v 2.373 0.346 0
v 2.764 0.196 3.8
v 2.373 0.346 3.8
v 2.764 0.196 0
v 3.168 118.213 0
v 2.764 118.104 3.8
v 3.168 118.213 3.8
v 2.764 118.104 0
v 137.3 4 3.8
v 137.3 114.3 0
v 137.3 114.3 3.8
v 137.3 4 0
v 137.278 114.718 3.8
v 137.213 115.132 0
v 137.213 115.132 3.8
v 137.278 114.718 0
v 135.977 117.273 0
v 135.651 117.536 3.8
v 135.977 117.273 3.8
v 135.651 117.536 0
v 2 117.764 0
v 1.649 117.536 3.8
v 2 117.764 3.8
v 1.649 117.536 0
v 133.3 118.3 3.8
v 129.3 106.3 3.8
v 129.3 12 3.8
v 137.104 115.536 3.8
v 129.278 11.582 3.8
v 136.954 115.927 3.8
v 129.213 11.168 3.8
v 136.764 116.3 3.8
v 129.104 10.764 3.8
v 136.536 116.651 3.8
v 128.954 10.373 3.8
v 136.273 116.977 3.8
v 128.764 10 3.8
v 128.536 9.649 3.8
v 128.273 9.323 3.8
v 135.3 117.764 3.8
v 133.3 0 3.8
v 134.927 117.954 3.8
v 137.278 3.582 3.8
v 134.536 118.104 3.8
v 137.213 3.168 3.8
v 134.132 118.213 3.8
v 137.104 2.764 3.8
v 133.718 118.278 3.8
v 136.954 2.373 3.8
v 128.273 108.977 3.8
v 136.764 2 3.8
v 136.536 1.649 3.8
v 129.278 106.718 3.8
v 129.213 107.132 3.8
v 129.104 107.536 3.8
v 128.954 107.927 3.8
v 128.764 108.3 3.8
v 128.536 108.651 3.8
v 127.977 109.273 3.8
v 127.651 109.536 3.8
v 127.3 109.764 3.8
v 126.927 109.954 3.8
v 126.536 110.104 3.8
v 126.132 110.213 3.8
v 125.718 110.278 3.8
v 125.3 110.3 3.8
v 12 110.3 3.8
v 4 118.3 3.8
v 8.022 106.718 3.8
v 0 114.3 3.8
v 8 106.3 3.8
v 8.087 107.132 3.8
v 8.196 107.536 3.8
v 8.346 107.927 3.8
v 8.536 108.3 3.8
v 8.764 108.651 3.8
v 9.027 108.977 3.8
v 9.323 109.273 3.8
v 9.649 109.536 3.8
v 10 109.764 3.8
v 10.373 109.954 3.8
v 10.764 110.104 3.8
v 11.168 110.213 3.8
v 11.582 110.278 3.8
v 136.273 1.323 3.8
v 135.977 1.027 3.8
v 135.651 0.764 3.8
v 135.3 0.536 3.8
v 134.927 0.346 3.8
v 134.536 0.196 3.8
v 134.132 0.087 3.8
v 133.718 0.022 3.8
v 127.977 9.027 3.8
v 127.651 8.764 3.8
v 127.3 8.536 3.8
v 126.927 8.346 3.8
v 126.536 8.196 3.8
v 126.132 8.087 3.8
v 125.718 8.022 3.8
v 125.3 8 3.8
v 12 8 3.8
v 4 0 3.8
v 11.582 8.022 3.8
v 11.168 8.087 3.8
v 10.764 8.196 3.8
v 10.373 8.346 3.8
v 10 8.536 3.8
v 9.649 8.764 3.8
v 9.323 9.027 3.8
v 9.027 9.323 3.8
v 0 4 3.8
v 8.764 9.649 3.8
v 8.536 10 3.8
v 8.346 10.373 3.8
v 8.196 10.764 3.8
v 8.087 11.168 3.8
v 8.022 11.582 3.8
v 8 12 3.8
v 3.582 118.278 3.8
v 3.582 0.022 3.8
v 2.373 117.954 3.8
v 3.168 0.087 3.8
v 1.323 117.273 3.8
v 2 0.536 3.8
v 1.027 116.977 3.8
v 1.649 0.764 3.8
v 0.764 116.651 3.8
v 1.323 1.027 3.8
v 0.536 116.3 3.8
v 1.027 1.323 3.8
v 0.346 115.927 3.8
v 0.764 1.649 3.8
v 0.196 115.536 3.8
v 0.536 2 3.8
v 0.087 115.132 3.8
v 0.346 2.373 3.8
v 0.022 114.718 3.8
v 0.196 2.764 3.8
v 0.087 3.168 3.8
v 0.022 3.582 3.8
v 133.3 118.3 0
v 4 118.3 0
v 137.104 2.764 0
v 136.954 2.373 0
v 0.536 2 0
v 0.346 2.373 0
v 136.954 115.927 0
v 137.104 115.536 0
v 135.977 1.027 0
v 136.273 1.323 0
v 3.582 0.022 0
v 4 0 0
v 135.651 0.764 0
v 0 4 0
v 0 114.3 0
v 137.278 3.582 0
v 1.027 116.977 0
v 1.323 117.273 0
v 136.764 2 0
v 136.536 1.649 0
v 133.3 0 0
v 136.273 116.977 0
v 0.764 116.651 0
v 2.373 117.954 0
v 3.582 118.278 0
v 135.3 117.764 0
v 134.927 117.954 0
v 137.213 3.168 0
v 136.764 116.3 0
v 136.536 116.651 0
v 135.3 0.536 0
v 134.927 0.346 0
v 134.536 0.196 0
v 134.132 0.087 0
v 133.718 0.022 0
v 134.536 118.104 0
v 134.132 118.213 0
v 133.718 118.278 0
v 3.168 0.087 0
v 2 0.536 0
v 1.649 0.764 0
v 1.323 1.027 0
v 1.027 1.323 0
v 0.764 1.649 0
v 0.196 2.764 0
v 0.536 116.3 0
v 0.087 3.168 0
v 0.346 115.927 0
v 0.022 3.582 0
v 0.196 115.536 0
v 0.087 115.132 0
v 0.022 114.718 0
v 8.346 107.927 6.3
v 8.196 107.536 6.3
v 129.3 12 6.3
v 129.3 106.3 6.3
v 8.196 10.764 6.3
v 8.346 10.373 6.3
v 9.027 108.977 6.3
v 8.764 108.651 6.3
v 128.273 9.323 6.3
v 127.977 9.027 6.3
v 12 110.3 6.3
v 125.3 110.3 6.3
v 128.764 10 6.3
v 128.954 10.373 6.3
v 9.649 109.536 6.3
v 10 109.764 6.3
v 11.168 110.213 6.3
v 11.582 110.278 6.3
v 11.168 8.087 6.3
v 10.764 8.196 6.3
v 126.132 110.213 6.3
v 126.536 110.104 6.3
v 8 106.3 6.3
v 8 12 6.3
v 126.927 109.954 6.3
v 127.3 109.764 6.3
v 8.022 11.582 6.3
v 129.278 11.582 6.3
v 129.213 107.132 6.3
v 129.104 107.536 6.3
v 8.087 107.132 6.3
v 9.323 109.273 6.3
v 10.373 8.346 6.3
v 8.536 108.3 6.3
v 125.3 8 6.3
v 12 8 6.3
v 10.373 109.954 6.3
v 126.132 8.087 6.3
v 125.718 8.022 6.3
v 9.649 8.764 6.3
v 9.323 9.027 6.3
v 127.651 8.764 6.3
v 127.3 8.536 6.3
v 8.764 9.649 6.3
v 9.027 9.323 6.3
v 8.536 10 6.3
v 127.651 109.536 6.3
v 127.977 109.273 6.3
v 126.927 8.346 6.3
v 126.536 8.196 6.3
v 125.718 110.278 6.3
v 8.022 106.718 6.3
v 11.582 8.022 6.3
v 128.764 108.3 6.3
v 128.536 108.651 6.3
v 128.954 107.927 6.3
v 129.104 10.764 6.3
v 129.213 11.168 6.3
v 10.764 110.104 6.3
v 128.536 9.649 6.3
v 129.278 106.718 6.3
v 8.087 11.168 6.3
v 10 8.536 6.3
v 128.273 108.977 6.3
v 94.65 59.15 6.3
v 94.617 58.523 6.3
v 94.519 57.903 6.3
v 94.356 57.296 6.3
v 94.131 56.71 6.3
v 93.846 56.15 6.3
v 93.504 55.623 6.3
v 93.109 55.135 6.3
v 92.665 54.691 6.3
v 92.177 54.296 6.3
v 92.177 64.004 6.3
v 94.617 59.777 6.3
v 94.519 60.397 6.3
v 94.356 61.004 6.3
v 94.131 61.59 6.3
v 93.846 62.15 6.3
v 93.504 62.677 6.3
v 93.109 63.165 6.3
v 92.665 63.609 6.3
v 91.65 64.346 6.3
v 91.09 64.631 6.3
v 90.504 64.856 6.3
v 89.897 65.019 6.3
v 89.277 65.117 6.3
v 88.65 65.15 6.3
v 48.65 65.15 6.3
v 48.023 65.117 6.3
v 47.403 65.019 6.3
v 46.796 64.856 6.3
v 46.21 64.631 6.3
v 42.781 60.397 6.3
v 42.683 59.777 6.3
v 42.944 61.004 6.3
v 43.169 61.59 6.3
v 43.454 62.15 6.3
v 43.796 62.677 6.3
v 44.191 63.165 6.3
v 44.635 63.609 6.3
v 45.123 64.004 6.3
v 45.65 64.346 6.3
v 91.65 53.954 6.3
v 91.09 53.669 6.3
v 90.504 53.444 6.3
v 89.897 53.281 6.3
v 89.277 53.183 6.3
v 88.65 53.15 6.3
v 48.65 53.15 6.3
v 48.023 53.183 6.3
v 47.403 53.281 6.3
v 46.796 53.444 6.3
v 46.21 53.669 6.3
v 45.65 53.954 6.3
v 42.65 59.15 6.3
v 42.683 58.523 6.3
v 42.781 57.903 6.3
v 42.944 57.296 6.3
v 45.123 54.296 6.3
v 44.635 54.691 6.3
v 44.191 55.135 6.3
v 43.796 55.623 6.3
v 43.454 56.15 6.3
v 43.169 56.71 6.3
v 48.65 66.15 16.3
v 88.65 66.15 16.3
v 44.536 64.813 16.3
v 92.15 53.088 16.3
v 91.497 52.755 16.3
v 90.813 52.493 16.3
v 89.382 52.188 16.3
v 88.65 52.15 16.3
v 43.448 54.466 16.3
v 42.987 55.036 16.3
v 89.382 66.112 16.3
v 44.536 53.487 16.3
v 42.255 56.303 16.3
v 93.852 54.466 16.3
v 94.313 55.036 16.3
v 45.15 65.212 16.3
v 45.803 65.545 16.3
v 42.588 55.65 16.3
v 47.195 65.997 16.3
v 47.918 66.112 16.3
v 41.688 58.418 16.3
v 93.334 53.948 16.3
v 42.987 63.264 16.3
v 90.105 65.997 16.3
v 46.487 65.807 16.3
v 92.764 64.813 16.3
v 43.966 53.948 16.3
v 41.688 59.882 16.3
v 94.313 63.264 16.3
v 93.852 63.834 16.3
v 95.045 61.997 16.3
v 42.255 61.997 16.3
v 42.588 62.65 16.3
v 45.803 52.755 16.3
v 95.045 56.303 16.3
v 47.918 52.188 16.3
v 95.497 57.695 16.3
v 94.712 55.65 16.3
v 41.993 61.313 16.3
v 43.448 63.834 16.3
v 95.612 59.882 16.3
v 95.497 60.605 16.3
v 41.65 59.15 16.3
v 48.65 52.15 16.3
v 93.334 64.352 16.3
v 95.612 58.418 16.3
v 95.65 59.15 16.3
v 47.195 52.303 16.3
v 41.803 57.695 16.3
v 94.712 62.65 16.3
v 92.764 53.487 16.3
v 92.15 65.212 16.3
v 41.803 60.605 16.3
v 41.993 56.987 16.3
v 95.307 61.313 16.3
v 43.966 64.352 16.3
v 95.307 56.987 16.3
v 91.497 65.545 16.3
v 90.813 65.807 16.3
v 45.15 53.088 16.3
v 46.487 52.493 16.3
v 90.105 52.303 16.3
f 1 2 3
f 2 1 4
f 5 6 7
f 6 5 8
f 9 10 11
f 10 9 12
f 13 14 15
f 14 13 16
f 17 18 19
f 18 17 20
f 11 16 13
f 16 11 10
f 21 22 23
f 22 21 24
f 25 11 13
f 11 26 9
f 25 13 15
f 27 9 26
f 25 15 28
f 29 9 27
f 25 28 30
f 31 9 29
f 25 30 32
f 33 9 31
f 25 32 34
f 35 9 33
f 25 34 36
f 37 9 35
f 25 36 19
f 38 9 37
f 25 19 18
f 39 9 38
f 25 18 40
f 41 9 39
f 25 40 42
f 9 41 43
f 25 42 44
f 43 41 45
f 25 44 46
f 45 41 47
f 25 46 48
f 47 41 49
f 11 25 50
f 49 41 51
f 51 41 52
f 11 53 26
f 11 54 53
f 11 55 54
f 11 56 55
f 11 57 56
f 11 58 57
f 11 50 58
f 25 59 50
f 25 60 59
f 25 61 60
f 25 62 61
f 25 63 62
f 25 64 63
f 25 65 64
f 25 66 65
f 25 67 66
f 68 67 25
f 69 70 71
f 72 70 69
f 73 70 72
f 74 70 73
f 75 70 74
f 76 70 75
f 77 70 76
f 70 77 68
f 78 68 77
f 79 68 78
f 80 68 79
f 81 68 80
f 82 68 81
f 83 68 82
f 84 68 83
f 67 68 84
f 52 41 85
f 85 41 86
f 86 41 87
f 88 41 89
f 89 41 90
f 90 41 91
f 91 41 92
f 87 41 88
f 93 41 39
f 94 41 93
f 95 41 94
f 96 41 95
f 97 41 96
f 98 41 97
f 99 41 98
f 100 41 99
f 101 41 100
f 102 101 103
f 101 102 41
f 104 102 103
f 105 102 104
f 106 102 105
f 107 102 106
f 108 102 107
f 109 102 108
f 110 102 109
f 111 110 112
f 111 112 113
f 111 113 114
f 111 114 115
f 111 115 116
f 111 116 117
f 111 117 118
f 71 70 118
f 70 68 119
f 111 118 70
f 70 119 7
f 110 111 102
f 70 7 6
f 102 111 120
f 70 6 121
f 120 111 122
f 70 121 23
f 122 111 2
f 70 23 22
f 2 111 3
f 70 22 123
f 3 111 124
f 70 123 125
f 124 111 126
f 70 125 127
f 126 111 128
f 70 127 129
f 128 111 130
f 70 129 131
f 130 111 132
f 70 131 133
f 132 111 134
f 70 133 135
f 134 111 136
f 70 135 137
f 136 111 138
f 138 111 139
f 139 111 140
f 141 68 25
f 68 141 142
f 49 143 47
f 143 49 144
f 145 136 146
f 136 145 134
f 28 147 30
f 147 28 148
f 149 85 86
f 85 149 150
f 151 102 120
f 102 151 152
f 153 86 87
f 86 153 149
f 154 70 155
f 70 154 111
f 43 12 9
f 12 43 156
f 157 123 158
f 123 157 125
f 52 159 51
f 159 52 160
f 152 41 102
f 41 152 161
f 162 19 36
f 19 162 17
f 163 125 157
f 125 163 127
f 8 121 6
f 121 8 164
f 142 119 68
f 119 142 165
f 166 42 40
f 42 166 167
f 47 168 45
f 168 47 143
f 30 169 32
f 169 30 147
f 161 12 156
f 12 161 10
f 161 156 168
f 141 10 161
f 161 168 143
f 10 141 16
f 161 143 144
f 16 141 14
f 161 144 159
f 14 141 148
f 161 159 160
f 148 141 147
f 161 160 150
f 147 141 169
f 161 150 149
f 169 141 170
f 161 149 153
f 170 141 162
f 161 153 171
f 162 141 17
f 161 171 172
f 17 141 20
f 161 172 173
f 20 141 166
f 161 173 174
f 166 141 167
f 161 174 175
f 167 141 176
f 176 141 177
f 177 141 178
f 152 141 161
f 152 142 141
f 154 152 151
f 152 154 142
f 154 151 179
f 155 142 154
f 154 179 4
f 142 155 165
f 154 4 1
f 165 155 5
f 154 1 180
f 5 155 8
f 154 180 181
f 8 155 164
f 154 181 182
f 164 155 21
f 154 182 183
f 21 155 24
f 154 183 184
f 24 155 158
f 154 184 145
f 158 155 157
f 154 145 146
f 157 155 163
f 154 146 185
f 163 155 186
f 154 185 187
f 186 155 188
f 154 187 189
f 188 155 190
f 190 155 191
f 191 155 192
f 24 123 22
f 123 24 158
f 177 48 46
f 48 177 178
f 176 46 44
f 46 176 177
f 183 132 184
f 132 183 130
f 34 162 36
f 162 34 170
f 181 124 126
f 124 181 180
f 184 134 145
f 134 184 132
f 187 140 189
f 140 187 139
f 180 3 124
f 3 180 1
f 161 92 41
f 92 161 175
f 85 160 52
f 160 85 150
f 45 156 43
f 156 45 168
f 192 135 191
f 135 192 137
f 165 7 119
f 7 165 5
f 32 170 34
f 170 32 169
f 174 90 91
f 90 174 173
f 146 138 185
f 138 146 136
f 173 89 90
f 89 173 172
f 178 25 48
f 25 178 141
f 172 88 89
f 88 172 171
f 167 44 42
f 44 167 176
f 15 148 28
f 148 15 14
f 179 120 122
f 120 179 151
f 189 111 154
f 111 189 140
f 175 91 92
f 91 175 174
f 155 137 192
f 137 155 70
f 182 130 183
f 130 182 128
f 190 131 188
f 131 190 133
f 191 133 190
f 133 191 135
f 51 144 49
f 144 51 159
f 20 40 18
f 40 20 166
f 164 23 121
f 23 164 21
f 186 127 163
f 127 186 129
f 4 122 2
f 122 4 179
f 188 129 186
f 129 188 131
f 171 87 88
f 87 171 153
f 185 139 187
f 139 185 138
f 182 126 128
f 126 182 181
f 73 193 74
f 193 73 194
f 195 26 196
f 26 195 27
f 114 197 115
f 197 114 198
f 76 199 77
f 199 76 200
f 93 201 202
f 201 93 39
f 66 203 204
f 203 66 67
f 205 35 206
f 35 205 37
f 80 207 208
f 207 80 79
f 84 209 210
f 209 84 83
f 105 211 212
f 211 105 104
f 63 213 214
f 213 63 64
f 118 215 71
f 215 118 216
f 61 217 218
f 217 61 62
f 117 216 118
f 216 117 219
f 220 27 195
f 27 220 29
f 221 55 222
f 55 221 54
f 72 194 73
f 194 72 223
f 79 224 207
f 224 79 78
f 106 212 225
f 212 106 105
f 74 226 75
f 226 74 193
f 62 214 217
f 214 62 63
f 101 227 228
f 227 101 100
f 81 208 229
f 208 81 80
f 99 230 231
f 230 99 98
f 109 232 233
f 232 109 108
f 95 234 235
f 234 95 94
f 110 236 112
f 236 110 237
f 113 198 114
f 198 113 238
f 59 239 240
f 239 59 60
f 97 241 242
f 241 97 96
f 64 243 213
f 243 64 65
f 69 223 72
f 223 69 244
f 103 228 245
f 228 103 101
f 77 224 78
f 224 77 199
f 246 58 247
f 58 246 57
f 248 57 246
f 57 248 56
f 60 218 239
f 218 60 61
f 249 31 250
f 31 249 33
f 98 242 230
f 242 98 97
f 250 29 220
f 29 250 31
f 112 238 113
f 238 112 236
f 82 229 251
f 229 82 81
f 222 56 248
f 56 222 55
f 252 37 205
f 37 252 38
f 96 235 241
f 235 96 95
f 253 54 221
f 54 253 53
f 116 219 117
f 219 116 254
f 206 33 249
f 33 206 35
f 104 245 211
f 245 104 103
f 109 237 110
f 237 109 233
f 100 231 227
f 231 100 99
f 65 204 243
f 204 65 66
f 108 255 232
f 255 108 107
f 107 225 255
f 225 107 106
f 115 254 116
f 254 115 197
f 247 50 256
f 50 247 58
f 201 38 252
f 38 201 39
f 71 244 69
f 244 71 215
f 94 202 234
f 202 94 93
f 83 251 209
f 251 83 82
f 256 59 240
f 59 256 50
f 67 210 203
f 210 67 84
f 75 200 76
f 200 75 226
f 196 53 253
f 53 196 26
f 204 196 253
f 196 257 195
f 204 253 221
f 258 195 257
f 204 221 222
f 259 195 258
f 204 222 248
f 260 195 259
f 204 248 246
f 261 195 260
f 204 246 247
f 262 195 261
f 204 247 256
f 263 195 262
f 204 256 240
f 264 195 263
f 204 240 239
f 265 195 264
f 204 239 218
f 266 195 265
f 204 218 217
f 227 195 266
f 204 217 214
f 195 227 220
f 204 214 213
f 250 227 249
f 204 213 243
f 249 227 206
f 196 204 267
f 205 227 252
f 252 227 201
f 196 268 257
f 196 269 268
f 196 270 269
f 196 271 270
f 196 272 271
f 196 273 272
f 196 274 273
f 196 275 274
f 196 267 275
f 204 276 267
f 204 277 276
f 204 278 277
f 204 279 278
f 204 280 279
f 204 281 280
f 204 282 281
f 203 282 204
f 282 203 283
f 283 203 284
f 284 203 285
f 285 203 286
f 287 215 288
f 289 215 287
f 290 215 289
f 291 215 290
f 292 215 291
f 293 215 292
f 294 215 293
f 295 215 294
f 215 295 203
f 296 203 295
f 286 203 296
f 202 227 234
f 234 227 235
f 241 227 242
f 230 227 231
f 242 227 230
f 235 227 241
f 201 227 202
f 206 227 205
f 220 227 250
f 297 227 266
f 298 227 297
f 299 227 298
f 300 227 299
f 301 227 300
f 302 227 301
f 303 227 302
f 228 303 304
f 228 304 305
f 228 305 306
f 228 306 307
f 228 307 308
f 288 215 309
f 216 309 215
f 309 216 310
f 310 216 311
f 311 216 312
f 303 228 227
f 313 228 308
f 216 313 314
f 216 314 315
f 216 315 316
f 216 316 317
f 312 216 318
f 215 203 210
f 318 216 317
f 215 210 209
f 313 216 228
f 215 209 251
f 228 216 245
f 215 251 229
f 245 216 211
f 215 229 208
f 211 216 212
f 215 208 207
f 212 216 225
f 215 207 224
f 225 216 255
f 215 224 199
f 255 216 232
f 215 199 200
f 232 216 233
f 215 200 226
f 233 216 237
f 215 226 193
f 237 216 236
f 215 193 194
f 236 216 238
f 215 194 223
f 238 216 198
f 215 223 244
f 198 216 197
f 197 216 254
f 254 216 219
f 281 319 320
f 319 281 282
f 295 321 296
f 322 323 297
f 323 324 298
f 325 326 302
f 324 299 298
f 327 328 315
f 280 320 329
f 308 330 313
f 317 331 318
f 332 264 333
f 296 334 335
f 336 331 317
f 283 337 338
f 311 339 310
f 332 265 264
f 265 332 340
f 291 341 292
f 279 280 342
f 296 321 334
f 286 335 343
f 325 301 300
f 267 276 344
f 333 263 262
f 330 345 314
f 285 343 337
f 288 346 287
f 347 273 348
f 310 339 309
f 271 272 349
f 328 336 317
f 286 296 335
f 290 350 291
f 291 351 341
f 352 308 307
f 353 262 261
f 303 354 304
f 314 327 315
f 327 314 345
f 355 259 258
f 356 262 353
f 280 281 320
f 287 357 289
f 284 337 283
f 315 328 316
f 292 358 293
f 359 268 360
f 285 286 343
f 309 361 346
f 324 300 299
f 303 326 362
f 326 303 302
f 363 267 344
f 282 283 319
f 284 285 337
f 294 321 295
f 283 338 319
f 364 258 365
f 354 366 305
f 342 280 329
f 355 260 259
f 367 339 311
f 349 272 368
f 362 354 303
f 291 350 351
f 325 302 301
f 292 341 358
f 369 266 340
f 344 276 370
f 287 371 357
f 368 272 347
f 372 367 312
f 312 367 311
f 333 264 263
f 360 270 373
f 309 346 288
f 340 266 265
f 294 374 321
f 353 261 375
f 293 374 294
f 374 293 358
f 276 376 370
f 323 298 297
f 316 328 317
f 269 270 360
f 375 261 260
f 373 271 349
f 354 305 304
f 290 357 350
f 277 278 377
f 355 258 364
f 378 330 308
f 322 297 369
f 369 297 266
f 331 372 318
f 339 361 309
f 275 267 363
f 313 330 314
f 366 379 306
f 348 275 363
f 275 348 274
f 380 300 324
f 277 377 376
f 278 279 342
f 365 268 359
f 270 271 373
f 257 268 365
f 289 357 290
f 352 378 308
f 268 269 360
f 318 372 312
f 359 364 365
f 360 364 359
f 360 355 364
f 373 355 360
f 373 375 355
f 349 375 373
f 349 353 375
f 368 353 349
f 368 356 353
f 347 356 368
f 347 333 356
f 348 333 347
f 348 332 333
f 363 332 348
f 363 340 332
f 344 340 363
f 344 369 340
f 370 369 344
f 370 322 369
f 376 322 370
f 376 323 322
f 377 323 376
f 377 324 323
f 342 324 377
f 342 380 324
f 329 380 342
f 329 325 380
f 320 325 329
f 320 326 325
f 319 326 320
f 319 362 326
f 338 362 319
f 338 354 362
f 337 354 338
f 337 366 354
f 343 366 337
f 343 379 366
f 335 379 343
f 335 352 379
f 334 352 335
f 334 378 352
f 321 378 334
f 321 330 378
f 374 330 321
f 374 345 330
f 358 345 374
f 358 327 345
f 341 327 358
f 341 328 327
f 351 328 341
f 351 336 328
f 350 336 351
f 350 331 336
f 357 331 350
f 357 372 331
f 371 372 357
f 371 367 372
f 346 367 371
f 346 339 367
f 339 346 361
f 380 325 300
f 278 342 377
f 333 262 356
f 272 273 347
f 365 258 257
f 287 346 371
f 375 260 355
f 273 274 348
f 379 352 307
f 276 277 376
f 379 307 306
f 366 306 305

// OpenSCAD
// file: config.scad
// ==============================================================================
// RETRO VENDING MACHINE CANDY DISPENSER - CONFIGURATION & PARAMETERS
// ==============================================================================
// Designed for: Sindoh 3DWOX 2X DP303 (Max build volume: 228 x 200 x 300 mm)
// Actuation: 28BYJ-48 Stepper Motor (5V) + ULN2003 Driver Board
// Controller: Raspberry Pi 5 (Single Board Computer)
// Fasteners: 20-Series Aluminum Profile Standard M4 Bolts (Button/Socket head)
// ==============================================================================

$fn = 60; // Smoothness for circles/curves

// ------------------------------------------------------------------------------
// 1. CANDY DIMENSIONS (Xiao Ke Ao La - Expanded Envelope: +7mm Width, +5mm Height)
// ------------------------------------------------------------------------------
// User specified expansion:
// - Length (가로/X): 30.5 mm
// - Width  (세로/Y): 16.5 + 7.0 = 23.5 mm (+7mm for crinkled/puffed wrapper wings)
// - Height (두께/Z): 12.0 + 5.0 = 17.0 mm (+5mm for high-pillow wrapper puff)
candy_length         = 30.5; // Length with crimped zigzag wings
candy_width          = 23.5; // Expanded pouch width (16.5 + 7.0)
candy_thickness      = 17.0; // Expanded bulging height (12.0 + 5.0)

// Directional guide throat in hopper (forces candy to align lengthwise)
// 28.0mm < 30.5mm candy length -> physically impossible to turn sideways!
// 28.0mm > 23.5mm candy width  -> smooth frictionless gravity slide (+4.5mm clearance)
hopper_throat_w      = 28.0; 
hopper_throat_l      = 44.0;

// Drum Single-Candy Pocket (V-tapered scoop geometry tailored to 30.5 x 23.5 x 17.0 mm)
candy_pocket_len     = 36.0; // Axial length (+5.5mm clearance)
candy_pocket_mouth_w = 29.5; // Wide top funnel mouth to catch dropping candy (+6.0mm)
candy_pocket_bot_w   = 25.5; // Snug bottom seating (+2.0mm)
candy_pocket_depth   = 19.5; // Radial depth (+2.5mm clearance over 17mm; 2nd candy exceeds by 14.5mm)

// ------------------------------------------------------------------------------
// 2. 20-SERIES STANDARD FASTENERS (M4 Bolts)
// ------------------------------------------------------------------------------
m4_clearance_dia     = 4.5;  // M4 bolt pass-through hole (with 3D print clearance)
m4_tap_dia           = 3.8;  // M4 self-threading pilot hole in plastic
m4_head_dia          = 8.5;  // M4 button/socket head counterbore
m4_head_h            = 3.2;  // M4 head depth

// ------------------------------------------------------------------------------
// 3. 3D PRINTING CLEARANCE & WALL THICKNESS
// ------------------------------------------------------------------------------
tol                  = 0.35; // Slip-fit radial clearance for 3DWOX 0.4mm nozzle
press_tol            = 0.15; // Tight friction-fit clearance
wall_thick           = 3.0;  // Sturdy structural wall thickness
floor_thick          = 3.0;  // Bottom floor thickness

// ------------------------------------------------------------------------------
// 4. STEPPER MOTOR (28BYJ-48) & SHAFT COUPLING
// ------------------------------------------------------------------------------
motor_shaft_dia_actual   = 5.2;  // User measured physical shaft outer diameter
motor_shaft_flat_actual  = 3.0;  // User measured physical D-cut flat thickness
motor_shaft_len          = 7.5;  // User measured physical shaft protrusion length

motor_bore_dia           = motor_shaft_dia_actual + 0.25; // 5.45 mm
motor_bore_flat          = motor_shaft_flat_actual + 0.20; // 3.20 mm

motor_body_dia       = 28.2;
motor_body_depth     = 19.5;
motor_ears_spacing   = 35.0; // Distance between ear hole centers
motor_ear_hole_dia   = 4.2;  // Accommodates M4 or M3 bolts
motor_boss_dia       = 9.2;
motor_boss_len       = 1.5;
motor_eccentric_dist = 8.0;

// ------------------------------------------------------------------------------
// 5. METERING DRUM DIMENSIONS (Scaled for 17.0mm depth)
// ------------------------------------------------------------------------------
drum_dia             = 66.0; // Expanded to 66mm to maintain 10.8mm solid hub backing
drum_len             = 52.0;
drum_shaft_hub_len   = 8.0;
drum_wall_gap        = 0.6;  // Running clearance

// ------------------------------------------------------------------------------
// 6. RASPBERRY PI 5 DIMENSIONS & MOUNTING (Standard M2.5)
// ------------------------------------------------------------------------------
pi_len               = 85.0;
pi_wid               = 56.0;
pi_pcb_thick         = 1.6;
pi_hole_dist_x       = 49.0;
pi_hole_dist_y       = 58.0;
pi_standoff_dia      = 6.5;
pi_standoff_h        = 5.0;
pi_hole_dia          = 2.6; // M2.5 pilot hole (Pi 5 PCB standard)

// ------------------------------------------------------------------------------
// 7. ULN2003 DRIVER BOARD (M3 / M4)
// ------------------------------------------------------------------------------
uln_pcb_len          = 35.0;
uln_pcb_wid          = 32.0;
uln_hole_dist_x      = 30.0;
uln_hole_dist_y      = 26.5;
uln_hole_dia         = 3.6;
uln_standoff_h       = 4.0;

// ------------------------------------------------------------------------------
// 8. MACHINE OVERALL ENVELOPE (Strictly under 3DWOX 200x200mm XY limit)
// ------------------------------------------------------------------------------
machine_wid          = 150.0;
machine_depth        = 135.0;
base_height          = 45.0;
mid_height           = 95.0;
hopper_height        = 85.0;

divider_x            = 68.0;
// main file
// ==============================================================================
// CANDY DISPENSER - TOP LID (refill cover, prints flat)
// ==============================================================================
// Sits perfectly flush into top_hopper's built-in 4.0mm stepped rim recess.
// Flat bottom on the print bed, so no supports are needed.
// Prints in ~1 hour with flawless surface finish.
// Features retro stepped crown bevel and integrated ergonomic grip handle.
// ==============================================================================

include <config.scad>;

module top_lid() {
    lid_w = machine_wid - 12 - 2 * tol;     // 137.3 mm (fits into 138.0mm hopper recess)
    lid_d = machine_depth - 16 - 2 * tol;    // 118.3 mm (fits into 119.0mm hopper recess)
    lid_t = 3.8; // Plate thickness (fits flush inside 4.0mm hopper recess)

    union() {
        // 1. Flat bottom base plate
        hull() {
            translate([4, 4, 0]) cylinder(r = 4, h = lid_t);
            translate([lid_w - 4, 4, 0]) cylinder(r = 4, h = lid_t);
            translate([lid_w - 4, lid_d - 4, 0]) cylinder(r = 4, h = lid_t);
            translate([4, lid_d - 4, 0]) cylinder(r = 4, h = lid_t);
        }

        // 2. Stepped Decorative Top Dome (Vintage Retro Bevel)
        translate([8, 8, lid_t]) {
            hull() {
                translate([4, 4, 0]) cylinder(r = 4, h = 2.5);
                translate([lid_w - 20, 4, 0]) cylinder(r = 4, h = 2.5);
                translate([lid_w - 20, lid_d - 20, 0]) cylinder(r = 4, h = 2.5);
                translate([4, lid_d - 20, 0]) cylinder(r = 4, h = 2.5);
            }
        }

        // 3. Retro Handle / Ergonomic Grip Knob on Top
        translate([lid_w / 2 - 25, lid_d / 2 - 6, lid_t + 2.5]) {
            hull() {
                // Tapered grip with smooth 45° self-supporting overhangs
                translate([5, 6, 0]) cylinder(d1 = 12, d2 = 14, h = 10);
                translate([45, 6, 0]) cylinder(d1 = 12, d2 = 14, h = 10);
            }
        }
    }
}

// Standalone render
top_lid();
